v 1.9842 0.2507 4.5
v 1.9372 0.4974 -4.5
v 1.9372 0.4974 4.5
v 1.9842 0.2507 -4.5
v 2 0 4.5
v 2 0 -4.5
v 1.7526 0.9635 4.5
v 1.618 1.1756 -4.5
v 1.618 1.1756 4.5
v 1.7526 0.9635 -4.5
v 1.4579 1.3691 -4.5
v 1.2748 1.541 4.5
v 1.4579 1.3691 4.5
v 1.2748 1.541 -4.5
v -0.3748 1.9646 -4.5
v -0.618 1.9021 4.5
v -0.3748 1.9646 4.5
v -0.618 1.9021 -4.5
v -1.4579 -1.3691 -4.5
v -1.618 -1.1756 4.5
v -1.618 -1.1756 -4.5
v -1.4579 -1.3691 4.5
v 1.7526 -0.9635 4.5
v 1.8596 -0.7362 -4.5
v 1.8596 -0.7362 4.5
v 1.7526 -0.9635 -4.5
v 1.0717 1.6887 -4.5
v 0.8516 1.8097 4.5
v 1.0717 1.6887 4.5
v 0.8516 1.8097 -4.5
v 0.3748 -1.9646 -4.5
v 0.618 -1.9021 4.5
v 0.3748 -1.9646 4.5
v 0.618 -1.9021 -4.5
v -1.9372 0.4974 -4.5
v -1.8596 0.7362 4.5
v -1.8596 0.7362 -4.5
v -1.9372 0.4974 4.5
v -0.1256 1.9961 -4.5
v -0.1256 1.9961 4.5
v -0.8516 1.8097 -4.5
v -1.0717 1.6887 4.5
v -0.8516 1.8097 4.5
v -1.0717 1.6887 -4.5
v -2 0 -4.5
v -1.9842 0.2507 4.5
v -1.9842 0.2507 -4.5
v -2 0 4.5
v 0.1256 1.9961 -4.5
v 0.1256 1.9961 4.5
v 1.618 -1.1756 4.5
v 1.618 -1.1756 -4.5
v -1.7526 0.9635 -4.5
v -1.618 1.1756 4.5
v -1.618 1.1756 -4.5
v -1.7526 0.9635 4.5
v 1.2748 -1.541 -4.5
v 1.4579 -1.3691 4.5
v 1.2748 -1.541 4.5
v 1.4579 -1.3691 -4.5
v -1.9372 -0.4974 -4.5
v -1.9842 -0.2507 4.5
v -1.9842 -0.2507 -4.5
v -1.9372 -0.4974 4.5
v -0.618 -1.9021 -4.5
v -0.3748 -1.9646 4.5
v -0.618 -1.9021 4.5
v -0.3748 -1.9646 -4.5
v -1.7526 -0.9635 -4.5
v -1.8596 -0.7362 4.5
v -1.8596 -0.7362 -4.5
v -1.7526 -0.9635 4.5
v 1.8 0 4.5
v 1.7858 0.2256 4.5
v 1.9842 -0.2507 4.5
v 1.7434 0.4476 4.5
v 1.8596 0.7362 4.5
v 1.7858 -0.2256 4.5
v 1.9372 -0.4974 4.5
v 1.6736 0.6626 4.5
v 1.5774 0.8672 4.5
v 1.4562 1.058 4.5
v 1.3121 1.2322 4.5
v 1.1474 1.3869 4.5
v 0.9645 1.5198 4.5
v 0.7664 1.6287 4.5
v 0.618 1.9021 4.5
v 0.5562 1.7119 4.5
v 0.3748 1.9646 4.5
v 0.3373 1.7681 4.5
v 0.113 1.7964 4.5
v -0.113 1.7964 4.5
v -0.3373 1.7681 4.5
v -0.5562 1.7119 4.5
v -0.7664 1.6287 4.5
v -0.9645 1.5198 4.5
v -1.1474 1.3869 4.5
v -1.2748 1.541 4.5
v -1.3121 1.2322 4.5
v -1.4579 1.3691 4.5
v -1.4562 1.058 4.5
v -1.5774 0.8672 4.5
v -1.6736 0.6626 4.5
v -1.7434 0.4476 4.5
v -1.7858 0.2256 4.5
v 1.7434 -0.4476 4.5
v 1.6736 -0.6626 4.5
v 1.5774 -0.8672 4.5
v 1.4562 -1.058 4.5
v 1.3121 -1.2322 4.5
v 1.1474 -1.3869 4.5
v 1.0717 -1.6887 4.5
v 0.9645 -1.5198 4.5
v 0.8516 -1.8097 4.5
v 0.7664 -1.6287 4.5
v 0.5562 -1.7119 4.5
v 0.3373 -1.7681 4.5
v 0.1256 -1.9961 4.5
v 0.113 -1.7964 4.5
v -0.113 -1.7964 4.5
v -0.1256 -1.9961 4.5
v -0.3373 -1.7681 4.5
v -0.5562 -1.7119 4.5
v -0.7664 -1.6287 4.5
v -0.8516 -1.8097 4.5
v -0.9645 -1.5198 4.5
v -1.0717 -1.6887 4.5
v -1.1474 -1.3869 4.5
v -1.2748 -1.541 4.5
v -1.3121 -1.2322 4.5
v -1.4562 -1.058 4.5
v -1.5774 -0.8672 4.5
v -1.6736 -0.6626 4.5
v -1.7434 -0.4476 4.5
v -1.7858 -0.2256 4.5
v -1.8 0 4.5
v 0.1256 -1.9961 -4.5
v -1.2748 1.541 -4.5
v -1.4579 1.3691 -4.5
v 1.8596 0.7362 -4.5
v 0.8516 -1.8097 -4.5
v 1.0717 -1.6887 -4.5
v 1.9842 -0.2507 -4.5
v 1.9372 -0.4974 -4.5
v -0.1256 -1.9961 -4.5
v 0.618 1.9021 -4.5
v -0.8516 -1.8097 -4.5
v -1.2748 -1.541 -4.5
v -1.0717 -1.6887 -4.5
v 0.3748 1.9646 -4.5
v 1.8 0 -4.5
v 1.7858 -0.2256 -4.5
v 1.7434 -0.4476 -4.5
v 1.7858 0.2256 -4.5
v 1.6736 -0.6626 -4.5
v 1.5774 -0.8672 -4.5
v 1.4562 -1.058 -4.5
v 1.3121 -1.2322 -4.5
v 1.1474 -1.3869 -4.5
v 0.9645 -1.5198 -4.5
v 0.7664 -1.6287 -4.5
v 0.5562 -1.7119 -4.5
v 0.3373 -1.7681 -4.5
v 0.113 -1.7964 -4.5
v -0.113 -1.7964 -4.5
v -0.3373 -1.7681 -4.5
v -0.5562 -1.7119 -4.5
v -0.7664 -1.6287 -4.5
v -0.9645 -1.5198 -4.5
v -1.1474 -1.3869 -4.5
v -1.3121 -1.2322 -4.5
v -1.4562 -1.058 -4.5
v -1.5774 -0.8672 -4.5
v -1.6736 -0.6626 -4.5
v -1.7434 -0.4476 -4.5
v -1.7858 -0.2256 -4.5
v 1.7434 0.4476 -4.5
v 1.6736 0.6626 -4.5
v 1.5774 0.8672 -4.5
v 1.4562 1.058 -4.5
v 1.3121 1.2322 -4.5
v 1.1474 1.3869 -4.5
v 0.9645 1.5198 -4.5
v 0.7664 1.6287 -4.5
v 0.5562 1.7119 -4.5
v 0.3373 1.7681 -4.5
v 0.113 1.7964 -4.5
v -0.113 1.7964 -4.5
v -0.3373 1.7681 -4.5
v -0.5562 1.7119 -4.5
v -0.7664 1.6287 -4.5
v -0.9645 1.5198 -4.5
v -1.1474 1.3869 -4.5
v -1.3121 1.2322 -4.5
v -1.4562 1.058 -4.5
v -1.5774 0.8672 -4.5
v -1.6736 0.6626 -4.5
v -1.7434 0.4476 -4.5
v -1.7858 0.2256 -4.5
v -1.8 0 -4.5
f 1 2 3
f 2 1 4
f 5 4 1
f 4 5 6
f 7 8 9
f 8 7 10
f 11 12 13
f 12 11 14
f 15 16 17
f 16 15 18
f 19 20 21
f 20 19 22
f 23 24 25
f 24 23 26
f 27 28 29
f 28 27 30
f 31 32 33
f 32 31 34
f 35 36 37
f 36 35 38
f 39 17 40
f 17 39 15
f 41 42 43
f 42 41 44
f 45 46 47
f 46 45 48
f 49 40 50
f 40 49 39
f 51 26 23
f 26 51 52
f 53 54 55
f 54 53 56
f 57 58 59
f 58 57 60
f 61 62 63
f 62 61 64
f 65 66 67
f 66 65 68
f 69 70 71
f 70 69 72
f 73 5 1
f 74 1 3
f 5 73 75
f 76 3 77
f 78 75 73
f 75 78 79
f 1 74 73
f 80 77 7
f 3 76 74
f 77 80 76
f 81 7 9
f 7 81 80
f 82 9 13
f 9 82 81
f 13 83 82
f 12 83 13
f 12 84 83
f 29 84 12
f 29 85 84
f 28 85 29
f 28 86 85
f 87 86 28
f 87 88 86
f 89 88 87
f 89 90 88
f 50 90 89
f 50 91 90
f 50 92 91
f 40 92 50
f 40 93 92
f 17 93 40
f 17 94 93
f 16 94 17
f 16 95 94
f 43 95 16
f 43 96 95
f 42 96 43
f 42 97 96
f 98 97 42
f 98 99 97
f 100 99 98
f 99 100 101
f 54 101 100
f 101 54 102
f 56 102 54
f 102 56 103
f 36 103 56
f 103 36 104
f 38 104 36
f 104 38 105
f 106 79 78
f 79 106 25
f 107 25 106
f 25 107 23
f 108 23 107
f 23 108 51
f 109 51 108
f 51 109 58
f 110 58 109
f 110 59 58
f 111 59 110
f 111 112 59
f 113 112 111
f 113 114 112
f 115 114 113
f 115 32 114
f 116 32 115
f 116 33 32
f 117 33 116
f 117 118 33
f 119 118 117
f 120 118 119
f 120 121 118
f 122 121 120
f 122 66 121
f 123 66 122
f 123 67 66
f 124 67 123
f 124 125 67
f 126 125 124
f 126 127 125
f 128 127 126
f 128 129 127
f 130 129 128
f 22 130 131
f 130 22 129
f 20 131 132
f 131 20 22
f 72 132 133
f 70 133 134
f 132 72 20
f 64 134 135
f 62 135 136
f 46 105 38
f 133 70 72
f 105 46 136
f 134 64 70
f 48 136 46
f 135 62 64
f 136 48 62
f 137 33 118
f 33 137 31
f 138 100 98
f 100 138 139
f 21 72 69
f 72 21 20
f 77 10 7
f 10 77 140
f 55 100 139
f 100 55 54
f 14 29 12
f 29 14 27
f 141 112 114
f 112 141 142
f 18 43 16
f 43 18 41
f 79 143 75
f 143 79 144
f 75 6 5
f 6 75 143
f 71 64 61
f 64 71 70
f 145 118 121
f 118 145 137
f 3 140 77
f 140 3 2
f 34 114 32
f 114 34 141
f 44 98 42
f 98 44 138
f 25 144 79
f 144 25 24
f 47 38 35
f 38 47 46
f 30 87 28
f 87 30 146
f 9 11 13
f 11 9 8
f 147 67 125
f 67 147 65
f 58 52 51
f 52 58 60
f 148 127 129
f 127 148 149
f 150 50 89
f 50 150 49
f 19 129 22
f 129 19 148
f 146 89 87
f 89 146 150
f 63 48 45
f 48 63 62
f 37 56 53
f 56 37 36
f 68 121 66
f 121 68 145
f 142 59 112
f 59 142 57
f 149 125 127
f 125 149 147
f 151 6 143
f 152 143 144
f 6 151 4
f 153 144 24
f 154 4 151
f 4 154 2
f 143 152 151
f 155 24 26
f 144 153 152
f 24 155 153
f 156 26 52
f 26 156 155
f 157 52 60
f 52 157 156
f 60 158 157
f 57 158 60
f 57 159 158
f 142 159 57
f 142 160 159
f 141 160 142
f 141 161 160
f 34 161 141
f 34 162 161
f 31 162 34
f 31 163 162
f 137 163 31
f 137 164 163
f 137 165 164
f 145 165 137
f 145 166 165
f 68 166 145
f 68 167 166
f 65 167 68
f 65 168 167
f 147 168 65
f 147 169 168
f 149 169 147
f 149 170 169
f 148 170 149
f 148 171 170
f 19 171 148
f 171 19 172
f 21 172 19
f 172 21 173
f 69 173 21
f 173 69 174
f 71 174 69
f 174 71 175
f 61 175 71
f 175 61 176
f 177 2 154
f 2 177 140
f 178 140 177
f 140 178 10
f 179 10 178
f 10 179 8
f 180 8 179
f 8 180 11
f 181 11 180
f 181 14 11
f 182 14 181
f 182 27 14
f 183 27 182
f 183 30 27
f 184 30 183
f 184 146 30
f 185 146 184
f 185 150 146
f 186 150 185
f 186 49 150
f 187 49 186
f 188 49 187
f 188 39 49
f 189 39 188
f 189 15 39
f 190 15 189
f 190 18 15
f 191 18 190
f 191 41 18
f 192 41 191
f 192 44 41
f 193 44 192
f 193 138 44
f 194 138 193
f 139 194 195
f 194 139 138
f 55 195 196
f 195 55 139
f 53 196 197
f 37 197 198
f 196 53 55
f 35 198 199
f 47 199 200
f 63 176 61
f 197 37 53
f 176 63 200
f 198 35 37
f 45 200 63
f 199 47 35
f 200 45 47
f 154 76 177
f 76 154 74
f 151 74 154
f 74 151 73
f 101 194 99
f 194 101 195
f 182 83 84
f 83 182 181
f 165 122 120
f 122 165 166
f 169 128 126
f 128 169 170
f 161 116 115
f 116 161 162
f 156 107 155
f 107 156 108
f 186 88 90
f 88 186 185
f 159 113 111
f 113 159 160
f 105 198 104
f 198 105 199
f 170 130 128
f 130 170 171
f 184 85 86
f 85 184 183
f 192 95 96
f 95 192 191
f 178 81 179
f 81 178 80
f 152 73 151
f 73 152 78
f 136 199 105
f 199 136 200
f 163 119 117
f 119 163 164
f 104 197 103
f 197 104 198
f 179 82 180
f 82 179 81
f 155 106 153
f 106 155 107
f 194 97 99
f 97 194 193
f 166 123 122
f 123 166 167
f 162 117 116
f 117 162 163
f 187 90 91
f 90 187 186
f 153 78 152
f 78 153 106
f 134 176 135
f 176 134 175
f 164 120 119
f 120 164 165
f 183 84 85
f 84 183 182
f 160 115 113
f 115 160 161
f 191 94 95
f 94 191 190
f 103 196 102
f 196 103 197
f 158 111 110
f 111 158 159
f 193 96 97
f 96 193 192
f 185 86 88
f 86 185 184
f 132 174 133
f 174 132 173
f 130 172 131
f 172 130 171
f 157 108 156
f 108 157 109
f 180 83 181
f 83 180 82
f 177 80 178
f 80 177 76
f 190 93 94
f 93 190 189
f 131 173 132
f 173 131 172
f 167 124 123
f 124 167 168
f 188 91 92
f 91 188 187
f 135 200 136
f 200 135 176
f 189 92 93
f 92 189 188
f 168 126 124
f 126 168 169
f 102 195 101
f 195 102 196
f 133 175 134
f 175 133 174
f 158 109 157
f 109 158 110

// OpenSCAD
$fn = 50;


difference() {
	union() {
		translate(v = [0, 0, -4.5000000000]) {
			cylinder(h = 9, r = 2.0000000000);
		}
	}
	union() {
		#translate(v = [0, 0, -100.0000000000]) {
			cylinder(h = 200, r = 1.8000000000);
		}
	}
}
